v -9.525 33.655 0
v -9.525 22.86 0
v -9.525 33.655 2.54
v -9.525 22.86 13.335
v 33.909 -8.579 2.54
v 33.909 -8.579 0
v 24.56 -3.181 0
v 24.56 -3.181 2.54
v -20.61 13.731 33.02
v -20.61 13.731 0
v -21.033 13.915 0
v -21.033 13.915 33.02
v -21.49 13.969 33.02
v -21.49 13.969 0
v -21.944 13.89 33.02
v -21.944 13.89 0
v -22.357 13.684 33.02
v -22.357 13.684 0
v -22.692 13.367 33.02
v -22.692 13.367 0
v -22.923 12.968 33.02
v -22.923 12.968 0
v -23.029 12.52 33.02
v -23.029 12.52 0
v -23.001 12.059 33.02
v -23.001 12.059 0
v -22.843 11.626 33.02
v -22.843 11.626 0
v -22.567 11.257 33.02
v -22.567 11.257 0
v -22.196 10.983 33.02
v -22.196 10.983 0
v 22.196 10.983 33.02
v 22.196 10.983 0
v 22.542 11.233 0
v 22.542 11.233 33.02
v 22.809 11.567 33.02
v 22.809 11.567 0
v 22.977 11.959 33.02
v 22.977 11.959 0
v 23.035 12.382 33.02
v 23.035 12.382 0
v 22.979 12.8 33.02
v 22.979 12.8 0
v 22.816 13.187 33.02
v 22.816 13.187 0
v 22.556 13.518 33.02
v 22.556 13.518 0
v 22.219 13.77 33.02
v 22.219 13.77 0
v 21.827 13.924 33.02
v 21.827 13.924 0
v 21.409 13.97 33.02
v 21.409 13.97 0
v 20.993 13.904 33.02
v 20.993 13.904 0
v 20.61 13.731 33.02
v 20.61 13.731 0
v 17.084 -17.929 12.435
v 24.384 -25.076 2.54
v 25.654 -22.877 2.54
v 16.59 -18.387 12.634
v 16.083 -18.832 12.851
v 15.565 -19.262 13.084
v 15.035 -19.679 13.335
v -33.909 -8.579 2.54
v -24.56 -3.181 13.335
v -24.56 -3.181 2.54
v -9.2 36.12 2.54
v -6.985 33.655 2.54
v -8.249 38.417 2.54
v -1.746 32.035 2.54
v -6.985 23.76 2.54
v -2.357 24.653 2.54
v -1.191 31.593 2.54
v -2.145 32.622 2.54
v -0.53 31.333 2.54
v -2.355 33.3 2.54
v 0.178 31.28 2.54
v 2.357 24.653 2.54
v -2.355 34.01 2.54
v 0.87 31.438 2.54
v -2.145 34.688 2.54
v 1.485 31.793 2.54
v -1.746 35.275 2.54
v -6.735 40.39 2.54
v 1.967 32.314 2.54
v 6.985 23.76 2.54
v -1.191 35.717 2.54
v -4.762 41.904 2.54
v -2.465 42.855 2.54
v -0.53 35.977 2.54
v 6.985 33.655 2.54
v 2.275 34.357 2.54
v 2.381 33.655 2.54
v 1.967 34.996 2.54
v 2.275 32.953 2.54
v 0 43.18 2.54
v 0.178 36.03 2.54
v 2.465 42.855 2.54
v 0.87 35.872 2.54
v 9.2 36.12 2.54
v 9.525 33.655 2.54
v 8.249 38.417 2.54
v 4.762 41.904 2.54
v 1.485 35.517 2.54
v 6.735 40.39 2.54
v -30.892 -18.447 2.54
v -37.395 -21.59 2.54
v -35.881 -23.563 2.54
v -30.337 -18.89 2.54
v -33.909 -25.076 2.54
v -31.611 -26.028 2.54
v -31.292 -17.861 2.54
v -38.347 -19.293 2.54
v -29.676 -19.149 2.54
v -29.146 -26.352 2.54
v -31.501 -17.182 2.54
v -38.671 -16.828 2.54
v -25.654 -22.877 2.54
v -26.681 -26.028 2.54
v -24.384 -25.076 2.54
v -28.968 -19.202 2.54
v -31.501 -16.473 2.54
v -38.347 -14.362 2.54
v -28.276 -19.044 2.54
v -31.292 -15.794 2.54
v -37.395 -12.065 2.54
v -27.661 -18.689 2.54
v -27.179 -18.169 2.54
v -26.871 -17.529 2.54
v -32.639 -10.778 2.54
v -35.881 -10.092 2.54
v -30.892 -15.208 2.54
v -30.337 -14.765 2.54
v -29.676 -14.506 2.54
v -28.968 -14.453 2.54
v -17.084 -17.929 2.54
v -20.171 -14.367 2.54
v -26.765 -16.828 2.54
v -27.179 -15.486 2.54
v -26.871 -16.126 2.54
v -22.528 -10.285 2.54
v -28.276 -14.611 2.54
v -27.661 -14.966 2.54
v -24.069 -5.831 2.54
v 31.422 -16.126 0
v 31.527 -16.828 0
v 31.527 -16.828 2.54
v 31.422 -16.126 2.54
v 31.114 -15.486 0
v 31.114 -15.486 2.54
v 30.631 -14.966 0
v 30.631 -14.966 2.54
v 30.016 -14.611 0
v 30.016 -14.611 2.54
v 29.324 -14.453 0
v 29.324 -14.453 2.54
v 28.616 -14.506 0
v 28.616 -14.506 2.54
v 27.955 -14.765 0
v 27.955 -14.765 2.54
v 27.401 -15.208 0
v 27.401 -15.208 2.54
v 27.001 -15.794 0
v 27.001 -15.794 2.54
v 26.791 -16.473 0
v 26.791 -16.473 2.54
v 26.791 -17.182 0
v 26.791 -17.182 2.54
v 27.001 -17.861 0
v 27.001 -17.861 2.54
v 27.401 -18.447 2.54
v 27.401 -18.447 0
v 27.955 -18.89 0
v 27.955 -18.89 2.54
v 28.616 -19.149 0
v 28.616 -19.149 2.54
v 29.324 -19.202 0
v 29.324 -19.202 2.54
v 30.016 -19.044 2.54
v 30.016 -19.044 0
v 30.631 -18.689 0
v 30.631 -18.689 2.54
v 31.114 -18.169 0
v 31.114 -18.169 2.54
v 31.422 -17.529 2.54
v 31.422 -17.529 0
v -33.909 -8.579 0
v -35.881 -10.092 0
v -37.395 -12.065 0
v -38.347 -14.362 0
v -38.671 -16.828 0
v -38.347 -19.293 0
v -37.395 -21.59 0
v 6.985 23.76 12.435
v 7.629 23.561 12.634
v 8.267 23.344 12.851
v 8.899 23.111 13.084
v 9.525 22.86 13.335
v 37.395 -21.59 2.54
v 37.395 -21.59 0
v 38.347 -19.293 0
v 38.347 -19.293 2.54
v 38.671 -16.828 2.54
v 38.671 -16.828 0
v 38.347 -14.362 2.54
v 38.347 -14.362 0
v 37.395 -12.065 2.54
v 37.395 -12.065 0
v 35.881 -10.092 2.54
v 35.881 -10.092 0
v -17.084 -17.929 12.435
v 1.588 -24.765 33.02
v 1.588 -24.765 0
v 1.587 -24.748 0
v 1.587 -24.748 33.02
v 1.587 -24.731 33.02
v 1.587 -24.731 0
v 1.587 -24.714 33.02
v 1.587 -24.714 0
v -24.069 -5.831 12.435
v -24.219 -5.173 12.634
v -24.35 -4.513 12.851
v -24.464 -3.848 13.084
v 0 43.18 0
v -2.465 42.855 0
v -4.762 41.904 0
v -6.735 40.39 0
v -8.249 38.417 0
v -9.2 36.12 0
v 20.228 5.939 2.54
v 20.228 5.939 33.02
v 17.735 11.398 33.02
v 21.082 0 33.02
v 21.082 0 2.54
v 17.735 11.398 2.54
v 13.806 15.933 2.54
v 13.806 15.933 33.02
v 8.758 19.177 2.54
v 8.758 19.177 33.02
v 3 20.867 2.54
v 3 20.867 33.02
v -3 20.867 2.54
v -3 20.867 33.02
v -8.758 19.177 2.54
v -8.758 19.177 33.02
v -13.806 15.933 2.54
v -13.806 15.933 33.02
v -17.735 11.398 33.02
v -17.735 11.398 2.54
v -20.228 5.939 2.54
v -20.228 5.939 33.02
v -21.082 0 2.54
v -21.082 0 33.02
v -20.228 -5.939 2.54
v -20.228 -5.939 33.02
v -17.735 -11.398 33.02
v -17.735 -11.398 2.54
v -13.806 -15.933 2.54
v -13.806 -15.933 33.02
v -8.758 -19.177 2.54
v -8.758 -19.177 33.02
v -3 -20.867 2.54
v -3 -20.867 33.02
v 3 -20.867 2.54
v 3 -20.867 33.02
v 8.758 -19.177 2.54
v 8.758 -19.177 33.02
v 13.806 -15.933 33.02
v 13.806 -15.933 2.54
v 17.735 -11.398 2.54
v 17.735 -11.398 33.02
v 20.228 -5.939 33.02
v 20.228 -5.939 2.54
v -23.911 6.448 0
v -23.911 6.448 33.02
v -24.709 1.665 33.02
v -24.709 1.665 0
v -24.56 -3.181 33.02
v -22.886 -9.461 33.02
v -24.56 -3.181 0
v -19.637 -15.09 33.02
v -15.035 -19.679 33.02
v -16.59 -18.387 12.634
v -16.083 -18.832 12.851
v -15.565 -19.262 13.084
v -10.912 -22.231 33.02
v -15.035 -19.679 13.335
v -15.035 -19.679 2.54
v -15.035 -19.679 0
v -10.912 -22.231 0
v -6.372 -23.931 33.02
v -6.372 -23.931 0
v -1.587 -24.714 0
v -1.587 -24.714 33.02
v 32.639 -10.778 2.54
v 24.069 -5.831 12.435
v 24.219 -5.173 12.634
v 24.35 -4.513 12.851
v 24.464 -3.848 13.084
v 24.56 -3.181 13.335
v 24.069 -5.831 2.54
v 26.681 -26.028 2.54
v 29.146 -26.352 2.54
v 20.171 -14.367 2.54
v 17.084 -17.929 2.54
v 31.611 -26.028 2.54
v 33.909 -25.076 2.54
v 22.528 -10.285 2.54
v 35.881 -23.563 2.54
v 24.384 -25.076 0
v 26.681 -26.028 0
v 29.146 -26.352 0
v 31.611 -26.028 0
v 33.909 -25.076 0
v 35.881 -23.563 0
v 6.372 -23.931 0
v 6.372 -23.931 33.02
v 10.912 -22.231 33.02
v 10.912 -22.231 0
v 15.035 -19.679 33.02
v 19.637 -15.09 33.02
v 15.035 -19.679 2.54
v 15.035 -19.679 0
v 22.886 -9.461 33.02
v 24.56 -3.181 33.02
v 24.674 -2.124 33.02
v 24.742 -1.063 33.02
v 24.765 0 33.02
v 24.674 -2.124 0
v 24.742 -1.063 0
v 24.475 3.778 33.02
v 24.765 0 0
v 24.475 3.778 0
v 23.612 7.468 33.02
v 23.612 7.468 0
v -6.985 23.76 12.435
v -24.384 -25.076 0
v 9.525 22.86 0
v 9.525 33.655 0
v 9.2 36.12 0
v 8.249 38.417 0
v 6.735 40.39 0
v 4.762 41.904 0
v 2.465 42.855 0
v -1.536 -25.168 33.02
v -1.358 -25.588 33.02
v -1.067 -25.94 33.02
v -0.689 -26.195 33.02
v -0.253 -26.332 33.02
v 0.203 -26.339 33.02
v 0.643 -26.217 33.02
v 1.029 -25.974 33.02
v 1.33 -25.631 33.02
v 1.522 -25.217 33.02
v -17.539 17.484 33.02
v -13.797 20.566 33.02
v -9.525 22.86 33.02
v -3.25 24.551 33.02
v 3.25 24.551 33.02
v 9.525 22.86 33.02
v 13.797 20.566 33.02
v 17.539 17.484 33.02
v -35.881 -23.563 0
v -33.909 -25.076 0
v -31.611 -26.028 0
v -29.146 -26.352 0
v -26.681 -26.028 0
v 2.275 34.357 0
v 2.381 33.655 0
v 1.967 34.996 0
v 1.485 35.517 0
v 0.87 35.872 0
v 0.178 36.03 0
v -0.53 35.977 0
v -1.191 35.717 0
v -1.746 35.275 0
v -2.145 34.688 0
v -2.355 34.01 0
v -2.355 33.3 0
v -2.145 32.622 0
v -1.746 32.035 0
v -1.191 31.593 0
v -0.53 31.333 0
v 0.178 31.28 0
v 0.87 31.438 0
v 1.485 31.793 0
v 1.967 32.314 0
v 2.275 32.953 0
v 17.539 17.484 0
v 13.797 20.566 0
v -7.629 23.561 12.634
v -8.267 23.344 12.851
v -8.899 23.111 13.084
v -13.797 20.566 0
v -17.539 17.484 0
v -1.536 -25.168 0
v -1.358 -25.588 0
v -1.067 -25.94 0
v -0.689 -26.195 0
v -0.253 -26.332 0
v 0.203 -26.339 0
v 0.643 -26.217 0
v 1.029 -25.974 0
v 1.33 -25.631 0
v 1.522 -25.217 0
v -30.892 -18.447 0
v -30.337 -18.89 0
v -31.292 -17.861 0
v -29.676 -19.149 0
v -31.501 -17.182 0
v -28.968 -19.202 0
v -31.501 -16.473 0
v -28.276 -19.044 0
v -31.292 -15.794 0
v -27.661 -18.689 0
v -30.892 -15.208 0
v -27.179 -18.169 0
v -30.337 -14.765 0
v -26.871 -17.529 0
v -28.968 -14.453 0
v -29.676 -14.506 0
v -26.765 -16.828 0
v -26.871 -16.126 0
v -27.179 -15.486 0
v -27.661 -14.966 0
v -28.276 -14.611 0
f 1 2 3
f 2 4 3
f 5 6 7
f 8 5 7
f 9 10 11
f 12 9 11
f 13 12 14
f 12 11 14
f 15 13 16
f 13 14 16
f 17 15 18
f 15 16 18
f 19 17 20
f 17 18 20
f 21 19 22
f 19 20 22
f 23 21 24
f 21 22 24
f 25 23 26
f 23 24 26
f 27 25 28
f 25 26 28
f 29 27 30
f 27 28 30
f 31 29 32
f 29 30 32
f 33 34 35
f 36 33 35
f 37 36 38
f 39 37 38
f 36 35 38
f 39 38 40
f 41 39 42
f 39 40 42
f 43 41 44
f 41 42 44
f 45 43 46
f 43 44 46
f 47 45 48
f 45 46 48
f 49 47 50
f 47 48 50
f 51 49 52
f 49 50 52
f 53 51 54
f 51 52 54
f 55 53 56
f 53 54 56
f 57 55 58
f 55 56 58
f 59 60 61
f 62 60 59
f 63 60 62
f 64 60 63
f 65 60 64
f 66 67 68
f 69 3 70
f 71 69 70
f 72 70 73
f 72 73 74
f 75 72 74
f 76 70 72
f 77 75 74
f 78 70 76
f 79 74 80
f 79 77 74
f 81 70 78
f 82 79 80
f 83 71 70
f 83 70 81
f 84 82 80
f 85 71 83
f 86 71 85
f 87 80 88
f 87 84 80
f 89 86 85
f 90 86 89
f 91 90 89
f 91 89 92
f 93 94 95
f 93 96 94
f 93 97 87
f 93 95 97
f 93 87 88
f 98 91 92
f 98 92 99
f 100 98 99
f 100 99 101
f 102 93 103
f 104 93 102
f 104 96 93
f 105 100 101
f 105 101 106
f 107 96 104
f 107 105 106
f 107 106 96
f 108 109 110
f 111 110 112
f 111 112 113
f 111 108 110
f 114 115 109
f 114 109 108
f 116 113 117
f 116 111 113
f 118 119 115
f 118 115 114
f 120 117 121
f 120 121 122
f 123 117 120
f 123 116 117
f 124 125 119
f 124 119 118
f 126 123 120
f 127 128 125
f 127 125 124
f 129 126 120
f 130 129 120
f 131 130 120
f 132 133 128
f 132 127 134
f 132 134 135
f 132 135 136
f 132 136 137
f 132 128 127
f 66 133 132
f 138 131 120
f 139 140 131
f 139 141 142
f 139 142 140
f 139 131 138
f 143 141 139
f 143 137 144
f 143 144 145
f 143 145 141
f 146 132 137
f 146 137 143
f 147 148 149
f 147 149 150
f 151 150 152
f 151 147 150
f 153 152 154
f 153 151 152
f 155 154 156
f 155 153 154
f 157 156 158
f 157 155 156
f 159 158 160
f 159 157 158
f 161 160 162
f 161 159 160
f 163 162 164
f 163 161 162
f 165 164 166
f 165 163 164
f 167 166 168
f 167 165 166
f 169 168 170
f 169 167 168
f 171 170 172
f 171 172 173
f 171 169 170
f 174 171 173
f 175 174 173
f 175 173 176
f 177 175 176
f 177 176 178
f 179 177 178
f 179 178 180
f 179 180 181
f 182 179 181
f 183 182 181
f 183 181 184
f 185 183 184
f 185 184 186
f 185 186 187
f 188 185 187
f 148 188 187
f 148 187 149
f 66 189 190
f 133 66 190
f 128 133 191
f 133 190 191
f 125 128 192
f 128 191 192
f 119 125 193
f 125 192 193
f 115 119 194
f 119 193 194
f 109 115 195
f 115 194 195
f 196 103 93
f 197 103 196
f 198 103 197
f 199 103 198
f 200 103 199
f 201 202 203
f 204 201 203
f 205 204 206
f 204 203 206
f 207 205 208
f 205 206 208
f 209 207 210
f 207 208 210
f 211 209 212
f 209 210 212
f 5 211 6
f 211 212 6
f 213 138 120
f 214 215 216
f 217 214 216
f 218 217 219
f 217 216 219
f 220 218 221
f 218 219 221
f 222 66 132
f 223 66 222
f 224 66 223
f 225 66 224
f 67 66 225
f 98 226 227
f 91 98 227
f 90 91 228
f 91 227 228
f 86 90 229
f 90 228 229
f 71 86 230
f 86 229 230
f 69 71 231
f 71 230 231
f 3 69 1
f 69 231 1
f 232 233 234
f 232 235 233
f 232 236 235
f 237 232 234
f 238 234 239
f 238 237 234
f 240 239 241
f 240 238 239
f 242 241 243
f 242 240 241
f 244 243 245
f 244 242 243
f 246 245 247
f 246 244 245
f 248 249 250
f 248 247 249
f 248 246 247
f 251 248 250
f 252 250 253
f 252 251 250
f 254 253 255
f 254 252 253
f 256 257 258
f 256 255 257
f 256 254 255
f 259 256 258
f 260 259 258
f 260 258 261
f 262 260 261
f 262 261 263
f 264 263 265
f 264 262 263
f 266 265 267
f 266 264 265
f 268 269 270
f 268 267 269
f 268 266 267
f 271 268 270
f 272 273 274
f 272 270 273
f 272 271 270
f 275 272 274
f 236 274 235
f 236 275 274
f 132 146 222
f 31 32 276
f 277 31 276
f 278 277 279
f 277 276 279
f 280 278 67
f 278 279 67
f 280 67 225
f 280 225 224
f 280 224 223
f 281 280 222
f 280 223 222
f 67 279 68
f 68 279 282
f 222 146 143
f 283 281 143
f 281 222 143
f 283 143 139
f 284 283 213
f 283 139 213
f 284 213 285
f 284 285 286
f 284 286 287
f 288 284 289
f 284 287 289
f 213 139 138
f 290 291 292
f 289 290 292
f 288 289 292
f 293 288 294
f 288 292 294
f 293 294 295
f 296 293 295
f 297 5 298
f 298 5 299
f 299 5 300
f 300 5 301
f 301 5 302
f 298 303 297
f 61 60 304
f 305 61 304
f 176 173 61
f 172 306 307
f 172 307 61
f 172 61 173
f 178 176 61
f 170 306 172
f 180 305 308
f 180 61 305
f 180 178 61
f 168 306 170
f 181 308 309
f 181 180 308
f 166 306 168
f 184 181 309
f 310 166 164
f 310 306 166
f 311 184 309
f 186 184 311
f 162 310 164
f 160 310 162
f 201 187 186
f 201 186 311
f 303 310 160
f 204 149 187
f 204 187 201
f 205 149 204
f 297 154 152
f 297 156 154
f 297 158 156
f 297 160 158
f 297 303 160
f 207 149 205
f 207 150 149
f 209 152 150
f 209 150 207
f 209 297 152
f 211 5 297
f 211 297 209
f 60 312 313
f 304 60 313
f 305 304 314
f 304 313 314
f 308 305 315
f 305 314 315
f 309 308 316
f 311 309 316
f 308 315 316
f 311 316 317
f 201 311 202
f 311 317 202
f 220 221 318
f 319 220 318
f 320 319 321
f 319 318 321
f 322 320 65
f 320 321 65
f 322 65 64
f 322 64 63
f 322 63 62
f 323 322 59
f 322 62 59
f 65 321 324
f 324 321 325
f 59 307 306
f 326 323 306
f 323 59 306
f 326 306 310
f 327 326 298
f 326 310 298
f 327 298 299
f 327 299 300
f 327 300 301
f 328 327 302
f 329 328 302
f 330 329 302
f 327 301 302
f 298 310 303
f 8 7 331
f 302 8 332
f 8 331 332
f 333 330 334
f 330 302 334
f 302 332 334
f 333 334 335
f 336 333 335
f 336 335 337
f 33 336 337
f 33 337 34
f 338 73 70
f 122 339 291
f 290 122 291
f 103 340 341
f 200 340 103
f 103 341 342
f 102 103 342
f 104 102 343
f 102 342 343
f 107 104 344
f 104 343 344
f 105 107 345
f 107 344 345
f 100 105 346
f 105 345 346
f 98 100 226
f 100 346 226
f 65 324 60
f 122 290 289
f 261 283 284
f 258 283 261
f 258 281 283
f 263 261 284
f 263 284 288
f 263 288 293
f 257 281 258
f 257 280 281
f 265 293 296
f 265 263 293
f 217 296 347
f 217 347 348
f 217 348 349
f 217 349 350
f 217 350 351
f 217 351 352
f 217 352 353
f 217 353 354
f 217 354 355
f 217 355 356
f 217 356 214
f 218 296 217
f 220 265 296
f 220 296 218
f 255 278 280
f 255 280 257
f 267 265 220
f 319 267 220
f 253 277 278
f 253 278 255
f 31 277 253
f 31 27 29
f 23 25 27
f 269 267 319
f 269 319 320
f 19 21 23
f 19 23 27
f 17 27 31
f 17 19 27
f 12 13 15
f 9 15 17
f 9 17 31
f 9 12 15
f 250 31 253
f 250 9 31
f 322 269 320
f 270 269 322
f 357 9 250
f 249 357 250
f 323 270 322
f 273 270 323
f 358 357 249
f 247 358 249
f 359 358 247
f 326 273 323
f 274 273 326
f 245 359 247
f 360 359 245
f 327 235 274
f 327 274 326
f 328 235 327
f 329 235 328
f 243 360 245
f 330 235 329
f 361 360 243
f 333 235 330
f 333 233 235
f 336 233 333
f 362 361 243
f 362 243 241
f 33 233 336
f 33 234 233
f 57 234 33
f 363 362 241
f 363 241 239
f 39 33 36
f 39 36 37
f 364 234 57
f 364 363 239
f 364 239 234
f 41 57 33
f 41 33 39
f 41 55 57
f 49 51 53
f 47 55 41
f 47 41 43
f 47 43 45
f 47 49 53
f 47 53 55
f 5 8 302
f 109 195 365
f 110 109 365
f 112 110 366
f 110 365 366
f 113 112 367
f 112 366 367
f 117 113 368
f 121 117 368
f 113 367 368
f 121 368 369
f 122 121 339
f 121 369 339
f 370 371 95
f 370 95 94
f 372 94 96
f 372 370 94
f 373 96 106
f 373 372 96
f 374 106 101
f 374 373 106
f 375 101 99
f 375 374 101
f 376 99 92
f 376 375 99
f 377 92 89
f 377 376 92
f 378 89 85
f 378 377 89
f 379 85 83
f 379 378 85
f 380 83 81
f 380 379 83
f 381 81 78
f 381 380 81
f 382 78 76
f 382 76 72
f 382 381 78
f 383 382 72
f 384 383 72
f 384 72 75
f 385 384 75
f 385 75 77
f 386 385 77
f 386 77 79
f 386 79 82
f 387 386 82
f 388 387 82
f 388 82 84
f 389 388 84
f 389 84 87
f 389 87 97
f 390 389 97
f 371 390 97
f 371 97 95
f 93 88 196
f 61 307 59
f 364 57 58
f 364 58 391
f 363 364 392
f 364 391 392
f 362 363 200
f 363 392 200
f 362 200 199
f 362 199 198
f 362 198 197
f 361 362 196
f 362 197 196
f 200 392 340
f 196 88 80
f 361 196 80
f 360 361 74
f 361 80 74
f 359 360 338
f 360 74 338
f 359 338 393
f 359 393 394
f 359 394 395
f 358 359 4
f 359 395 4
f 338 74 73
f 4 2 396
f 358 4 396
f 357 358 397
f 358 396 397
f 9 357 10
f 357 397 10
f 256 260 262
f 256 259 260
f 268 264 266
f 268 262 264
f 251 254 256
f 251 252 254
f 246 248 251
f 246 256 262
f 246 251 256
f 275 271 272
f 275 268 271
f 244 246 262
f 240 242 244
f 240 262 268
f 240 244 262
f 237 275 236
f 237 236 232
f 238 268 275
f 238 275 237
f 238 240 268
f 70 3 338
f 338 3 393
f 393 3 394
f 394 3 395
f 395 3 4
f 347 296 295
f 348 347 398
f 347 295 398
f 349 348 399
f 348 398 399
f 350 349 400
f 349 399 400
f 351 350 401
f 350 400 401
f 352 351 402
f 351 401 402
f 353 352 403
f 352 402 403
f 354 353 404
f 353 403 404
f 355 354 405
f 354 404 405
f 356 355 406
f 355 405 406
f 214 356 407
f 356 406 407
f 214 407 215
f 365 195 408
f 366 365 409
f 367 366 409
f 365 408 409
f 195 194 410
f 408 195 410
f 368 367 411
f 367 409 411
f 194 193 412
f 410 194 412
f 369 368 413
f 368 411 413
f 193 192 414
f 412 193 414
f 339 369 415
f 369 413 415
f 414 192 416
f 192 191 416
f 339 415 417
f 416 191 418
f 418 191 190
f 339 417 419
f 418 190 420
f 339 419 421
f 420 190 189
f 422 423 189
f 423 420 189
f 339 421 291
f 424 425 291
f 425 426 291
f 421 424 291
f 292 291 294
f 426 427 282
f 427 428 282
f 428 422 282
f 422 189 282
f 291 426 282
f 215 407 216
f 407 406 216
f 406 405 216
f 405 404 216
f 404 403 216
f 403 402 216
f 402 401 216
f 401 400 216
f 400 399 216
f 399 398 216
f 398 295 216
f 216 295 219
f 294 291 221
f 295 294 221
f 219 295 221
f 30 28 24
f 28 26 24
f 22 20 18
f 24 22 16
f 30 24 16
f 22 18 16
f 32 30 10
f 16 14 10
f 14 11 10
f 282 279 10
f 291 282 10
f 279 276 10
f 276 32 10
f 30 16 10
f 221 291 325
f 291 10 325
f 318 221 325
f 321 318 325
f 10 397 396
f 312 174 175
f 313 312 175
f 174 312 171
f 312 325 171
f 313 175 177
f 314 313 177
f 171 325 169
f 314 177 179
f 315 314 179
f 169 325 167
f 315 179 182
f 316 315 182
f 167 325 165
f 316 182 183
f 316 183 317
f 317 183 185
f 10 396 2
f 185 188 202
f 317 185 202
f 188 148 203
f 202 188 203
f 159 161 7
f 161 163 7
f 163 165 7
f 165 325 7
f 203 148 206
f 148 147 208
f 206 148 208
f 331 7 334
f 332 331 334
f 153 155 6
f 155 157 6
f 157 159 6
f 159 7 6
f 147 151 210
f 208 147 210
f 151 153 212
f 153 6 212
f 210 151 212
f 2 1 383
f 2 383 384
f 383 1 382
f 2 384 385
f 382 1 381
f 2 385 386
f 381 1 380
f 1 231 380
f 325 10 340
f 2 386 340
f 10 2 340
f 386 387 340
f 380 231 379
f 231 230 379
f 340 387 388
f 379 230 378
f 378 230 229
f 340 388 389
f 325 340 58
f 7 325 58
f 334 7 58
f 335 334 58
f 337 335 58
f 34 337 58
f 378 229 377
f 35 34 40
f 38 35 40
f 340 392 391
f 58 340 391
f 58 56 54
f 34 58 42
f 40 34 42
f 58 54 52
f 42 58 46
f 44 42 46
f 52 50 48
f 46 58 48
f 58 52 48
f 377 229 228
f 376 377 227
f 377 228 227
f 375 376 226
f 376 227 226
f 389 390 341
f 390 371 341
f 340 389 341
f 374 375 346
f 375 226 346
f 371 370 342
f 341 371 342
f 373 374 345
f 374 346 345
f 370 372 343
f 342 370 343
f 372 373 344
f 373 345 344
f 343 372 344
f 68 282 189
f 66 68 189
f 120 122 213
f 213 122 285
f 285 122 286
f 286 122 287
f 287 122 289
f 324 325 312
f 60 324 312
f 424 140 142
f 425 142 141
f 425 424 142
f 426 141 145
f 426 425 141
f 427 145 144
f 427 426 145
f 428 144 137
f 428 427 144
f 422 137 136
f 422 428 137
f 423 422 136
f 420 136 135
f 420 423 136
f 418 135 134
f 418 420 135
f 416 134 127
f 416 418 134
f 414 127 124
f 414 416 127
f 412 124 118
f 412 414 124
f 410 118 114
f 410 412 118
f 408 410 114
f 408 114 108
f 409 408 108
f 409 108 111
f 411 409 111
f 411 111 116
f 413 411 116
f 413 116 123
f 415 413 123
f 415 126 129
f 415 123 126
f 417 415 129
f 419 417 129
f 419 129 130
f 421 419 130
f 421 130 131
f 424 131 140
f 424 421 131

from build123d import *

# Parameters (mm, degrees)
F0_R     = 21.082
F0_R_2   = 2.38125
F1_DEPTH = 2.54
F2_DEPTH = 33.02
F4_DEPTH = 2.54
F6_COUNT = 3
F6_ANGLE = 240


with BuildPart() as f1:
    # F0 (on Top) → F1 (new body)
    with BuildSketch(Plane.XY):
        with BuildLine():
            Line((-9.525, 22.86), (9.525, 22.86))
            ThreePointArc((9.525, 22.86), (0, 24.765), (-9.525, 22.86))
        make_face()
        with BuildLine():
            ThreePointArc((20.6097123392, 13.7311682786), (15.7435419805, 19.1166448654), (9.525, 22.86))
            Line((9.525, 22.86), (-9.525, 22.86))
            ThreePointArc((-9.525, 22.86), (-15.7435419805, 19.1166448654), (-20.6097123392, 13.7311682786))
            ThreePointArc((-20.6097123392, 13.7311682786), (-20.059758407, 13.154112914), (-19.8596191247, 12.3825))
            ThreePointArc((-19.8596191247, 12.3825), (-20.631435956, 11.0205832558), (-22.1963967225, 10.9829503112))
            ThreePointArc((-22.1963967225, 10.9829503112), (-24.4272710788, 4.075984868), (-24.5598407305, -3.181108029))
            Line((-24.5598407305, -3.181108029), (-15.0348407305, -19.678891971))
            ThreePointArc((-15.0348407305, -19.678891971), (-8.6837290983, -23.1926297333), (-1.5866843833, -24.7141185897))
            ThreePointArc((-1.5866843833, -24.7141185897), (0, -23.1775), (1.5866843833, -24.7141185897))
            ThreePointArc((1.5866843833, -24.7141185897), (8.6837290983, -23.1926297333), (15.0348407305, -19.678891971))
            Line((15.0348407305, -19.678891971), (24.5598407305, -3.181108029))
            ThreePointArc((24.5598407305, -3.181108029), (24.7136569602, -1.5938584173), (24.765, 0))
            ThreePointArc((24.765, 0), (24.1143006309, 5.6396569119), (22.1963967225, 10.9829503112))
            ThreePointArc((22.1963967225, 10.9829503112), (20.0723037962, 11.58875), (20.6097123392, 13.7311682786))
        make_face()
        Circle(F0_R, mode=Mode.SUBTRACT)
        with BuildLine():
            ThreePointArc((-9.525, 22.86), (0, 24.765), (9.525, 22.86))
            Line((9.525, 22.86), (9.525, 33.655))
            ThreePointArc((9.525, 33.655), (6.7351920908, 40.3901920908), (0, 43.18))
            ThreePointArc((0, 43.18), (-6.7351920908, 40.3901920908), (-9.525, 33.655))
            Line((-9.525, 33.655), (-9.525, 22.86))
        make_face()
        with Locations((0, 33.655)):
            Circle(F0_R_2, mode=Mode.SUBTRACT)
        with BuildLine():
            ThreePointArc((23.0346191247, 12.3825), (22.2187320387, 13.7698607177), (20.6097123392, 13.7311682786))
            ThreePointArc((20.6097123392, 13.7311682786), (21.4471191247, 12.3825), (22.1963967225, 10.9829503112))
            ThreePointArc((22.1963967225, 10.9829503112), (22.809035869, 11.5668168313), (23.0346191247, 12.3825))
        make_face()
        with BuildLine():
            ThreePointArc((22.1963967225, 10.9829503112), (21.4471191247, 12.3825), (20.6097123392, 13.7311682786))
            ThreePointArc((20.6097123392, 13.7311682786), (20.0723037962, 11.58875), (22.1963967225, 10.9829503112))
        make_face()
        with BuildLine():
            ThreePointArc((-19.8596191247, 12.3825), (-20.059758407, 13.154112914), (-20.6097123392, 13.7311682786))
            ThreePointArc((-20.6097123392, 13.7311682786), (-21.4471191247, 12.3825), (-22.1963967225, 10.9829503112))
            ThreePointArc((-22.1963967225, 10.9829503112), (-20.631435956, 11.0205832558), (-19.8596191247, 12.3825))
        make_face()
        with BuildLine():
            ThreePointArc((-22.1963967225, 10.9829503112), (-21.4471191247, 12.3825), (-20.6097123392, 13.7311682786))
            ThreePointArc((-20.6097123392, 13.7311682786), (-22.8219344532, 13.17625), (-22.1963967225, 10.9829503112))
        make_face()
        with BuildLine():
            Line((-15.0348407305, -19.678891971), (-24.5598407305, -3.181108029))
            ThreePointArc((-24.5598407305, -3.181108029), (-21.4471191247, -12.3825), (-15.0348407305, -19.678891971))
        make_face()
        with BuildLine():
            ThreePointArc((-15.0348407305, -19.678891971), (-21.4471191247, -12.3825), (-24.5598407305, -3.181108029))
            Line((-24.5598407305, -3.181108029), (-33.9085849644, -8.578608029))
            ThreePointArc((-33.9085849644, -8.578608029), (-38.3465284598, -14.3622485954), (-37.3949769354, -21.59))
            ThreePointArc((-37.3949769354, -21.59), (-31.611336369, -26.0279434954), (-24.3835849644, -25.076391971))
            Line((-24.3835849644, -25.076391971), (-15.0348407305, -19.678891971))
        make_face()
        with Locations((-29.1460849644, -16.8275)):
            Circle(F0_R_2, mode=Mode.SUBTRACT)
        with BuildLine():
            Line((33.9085849644, -8.578608029), (24.5598407305, -3.181108029))
            ThreePointArc((24.5598407305, -3.181108029), (21.4471191247, -12.3825), (15.0348407305, -19.678891971))
            Line((15.0348407305, -19.678891971), (24.3835849644, -25.076391971))
            ThreePointArc((24.3835849644, -25.076391971), (31.611336369, -26.0279434954), (37.3949769354, -21.59))
            ThreePointArc((37.3949769354, -21.59), (38.3465284598, -14.3622485954), (33.9085849644, -8.578608029))
        make_face()
        with Locations((29.1460849644, -16.8275)):
            Circle(F0_R_2, mode=Mode.SUBTRACT)
        with BuildLine():
            ThreePointArc((15.0348407305, -19.678891971), (21.4471191247, -12.3825), (24.5598407305, -3.181108029))
            Line((24.5598407305, -3.181108029), (15.0348407305, -19.678891971))
        make_face()
        with BuildLine():
            ThreePointArc((1.5866843833, -24.7141185897), (0, -23.1775), (-1.5866843833, -24.7141185897))
            ThreePointArc((-1.5866843833, -24.7141185897), (0, -24.765), (1.5866843833, -24.7141185897))
        make_face()
        with BuildLine():
            ThreePointArc((1.5866843833, -24.7141185897), (0, -24.765), (-1.5866843833, -24.7141185897))
            ThreePointArc((-1.5866843833, -24.7141185897), (-0.0254439735, -26.3522960827), (1.5875, -24.765))
            ThreePointArc((1.5875, -24.765), (1.5872960827, -24.7395560265), (1.5866843833, -24.7141185897))
        make_face()
        Circle(F0_R)
    extrude(amount=F1_DEPTH)

    # F0 (on Top) → F2 (join)
    with BuildSketch(Plane.XY):
        with BuildLine():
            ThreePointArc((20.6097123392, 13.7311682786), (15.7435419805, 19.1166448654), (9.525, 22.86))
            Line((9.525, 22.86), (-9.525, 22.86))
            ThreePointArc((-9.525, 22.86), (-15.7435419805, 19.1166448654), (-20.6097123392, 13.7311682786))
            ThreePointArc((-20.6097123392, 13.7311682786), (-20.059758407, 13.154112914), (-19.8596191247, 12.3825))
            ThreePointArc((-19.8596191247, 12.3825), (-20.631435956, 11.0205832558), (-22.1963967225, 10.9829503112))
            ThreePointArc((-22.1963967225, 10.9829503112), (-24.4272710788, 4.075984868), (-24.5598407305, -3.181108029))
            Line((-24.5598407305, -3.181108029), (-15.0348407305, -19.678891971))
            ThreePointArc((-15.0348407305, -19.678891971), (-8.6837290983, -23.1926297333), (-1.5866843833, -24.7141185897))
            ThreePointArc((-1.5866843833, -24.7141185897), (0, -23.1775), (1.5866843833, -24.7141185897))
            ThreePointArc((1.5866843833, -24.7141185897), (8.6837290983, -23.1926297333), (15.0348407305, -19.678891971))
            Line((15.0348407305, -19.678891971), (24.5598407305, -3.181108029))
            ThreePointArc((24.5598407305, -3.181108029), (24.7136569602, -1.5938584173), (24.765, 0))
            ThreePointArc((24.765, 0), (24.1143006309, 5.6396569119), (22.1963967225, 10.9829503112))
            ThreePointArc((22.1963967225, 10.9829503112), (20.0723037962, 11.58875), (20.6097123392, 13.7311682786))
        make_face()
        Circle(F0_R, mode=Mode.SUBTRACT)
        with BuildLine():
            Line((-15.0348407305, -19.678891971), (-24.5598407305, -3.181108029))
            ThreePointArc((-24.5598407305, -3.181108029), (-21.4471191247, -12.3825), (-15.0348407305, -19.678891971))
        make_face()
        with BuildLine():
            ThreePointArc((-19.8596191247, 12.3825), (-20.059758407, 13.154112914), (-20.6097123392, 13.7311682786))
            ThreePointArc((-20.6097123392, 13.7311682786), (-21.4471191247, 12.3825), (-22.1963967225, 10.9829503112))
            ThreePointArc((-22.1963967225, 10.9829503112), (-20.631435956, 11.0205832558), (-19.8596191247, 12.3825))
        make_face()
        with BuildLine():
            ThreePointArc((-22.1963967225, 10.9829503112), (-21.4471191247, 12.3825), (-20.6097123392, 13.7311682786))
            ThreePointArc((-20.6097123392, 13.7311682786), (-22.8219344532, 13.17625), (-22.1963967225, 10.9829503112))
        make_face()
        with BuildLine():
            ThreePointArc((22.1963967225, 10.9829503112), (21.4471191247, 12.3825), (20.6097123392, 13.7311682786))
            ThreePointArc((20.6097123392, 13.7311682786), (20.0723037962, 11.58875), (22.1963967225, 10.9829503112))
        make_face()
        with BuildLine():
            ThreePointArc((23.0346191247, 12.3825), (22.2187320387, 13.7698607177), (20.6097123392, 13.7311682786))
            ThreePointArc((20.6097123392, 13.7311682786), (21.4471191247, 12.3825), (22.1963967225, 10.9829503112))
            ThreePointArc((22.1963967225, 10.9829503112), (22.809035869, 11.5668168313), (23.0346191247, 12.3825))
        make_face()
        with BuildLine():
            ThreePointArc((1.5866843833, -24.7141185897), (0, -24.765), (-1.5866843833, -24.7141185897))
            ThreePointArc((-1.5866843833, -24.7141185897), (-0.0254439735, -26.3522960827), (1.5875, -24.765))
            ThreePointArc((1.5875, -24.765), (1.5872960827, -24.7395560265), (1.5866843833, -24.7141185897))
        make_face()
        with BuildLine():
            ThreePointArc((1.5866843833, -24.7141185897), (0, -23.1775), (-1.5866843833, -24.7141185897))
            ThreePointArc((-1.5866843833, -24.7141185897), (0, -24.765), (1.5866843833, -24.7141185897))
        make_face()
        with BuildLine():
            Line((-9.525, 22.86), (9.525, 22.86))
            ThreePointArc((9.525, 22.86), (0, 24.765), (-9.525, 22.86))
        make_face()
        with BuildLine():
            ThreePointArc((15.0348407305, -19.678891971), (21.4471191247, -12.3825), (24.5598407305, -3.181108029))
            Line((24.5598407305, -3.181108029), (15.0348407305, -19.678891971))
        make_face()
    extrude(amount=F2_DEPTH)

    # F3 (on face) → F4 (join)
    with BuildSketch(Plane.YZ.offset(9.525)):
        Polygon((22.86, 13.335), (22.86, 2.54), (33.655, 2.54), align=None)
    extrude(amount=-F4_DEPTH)

    # F5: F1 across plane


with BuildPart() as f1_1:
    add(f1.part)
    add(f1.part.mirror(Plane.YZ))

    # F6: F1 ×3 about axis
    f6_axis = Axis((0, 0, 2.54), (0, 0, -1))


with BuildPart() as f1_2:
    add(f1_1.part)
    for i in range(1, F6_COUNT):
        add(f1_1.part.rotate(f6_axis, i * F6_ANGLE / (F6_COUNT - 1)))


solid = f1_2.part
